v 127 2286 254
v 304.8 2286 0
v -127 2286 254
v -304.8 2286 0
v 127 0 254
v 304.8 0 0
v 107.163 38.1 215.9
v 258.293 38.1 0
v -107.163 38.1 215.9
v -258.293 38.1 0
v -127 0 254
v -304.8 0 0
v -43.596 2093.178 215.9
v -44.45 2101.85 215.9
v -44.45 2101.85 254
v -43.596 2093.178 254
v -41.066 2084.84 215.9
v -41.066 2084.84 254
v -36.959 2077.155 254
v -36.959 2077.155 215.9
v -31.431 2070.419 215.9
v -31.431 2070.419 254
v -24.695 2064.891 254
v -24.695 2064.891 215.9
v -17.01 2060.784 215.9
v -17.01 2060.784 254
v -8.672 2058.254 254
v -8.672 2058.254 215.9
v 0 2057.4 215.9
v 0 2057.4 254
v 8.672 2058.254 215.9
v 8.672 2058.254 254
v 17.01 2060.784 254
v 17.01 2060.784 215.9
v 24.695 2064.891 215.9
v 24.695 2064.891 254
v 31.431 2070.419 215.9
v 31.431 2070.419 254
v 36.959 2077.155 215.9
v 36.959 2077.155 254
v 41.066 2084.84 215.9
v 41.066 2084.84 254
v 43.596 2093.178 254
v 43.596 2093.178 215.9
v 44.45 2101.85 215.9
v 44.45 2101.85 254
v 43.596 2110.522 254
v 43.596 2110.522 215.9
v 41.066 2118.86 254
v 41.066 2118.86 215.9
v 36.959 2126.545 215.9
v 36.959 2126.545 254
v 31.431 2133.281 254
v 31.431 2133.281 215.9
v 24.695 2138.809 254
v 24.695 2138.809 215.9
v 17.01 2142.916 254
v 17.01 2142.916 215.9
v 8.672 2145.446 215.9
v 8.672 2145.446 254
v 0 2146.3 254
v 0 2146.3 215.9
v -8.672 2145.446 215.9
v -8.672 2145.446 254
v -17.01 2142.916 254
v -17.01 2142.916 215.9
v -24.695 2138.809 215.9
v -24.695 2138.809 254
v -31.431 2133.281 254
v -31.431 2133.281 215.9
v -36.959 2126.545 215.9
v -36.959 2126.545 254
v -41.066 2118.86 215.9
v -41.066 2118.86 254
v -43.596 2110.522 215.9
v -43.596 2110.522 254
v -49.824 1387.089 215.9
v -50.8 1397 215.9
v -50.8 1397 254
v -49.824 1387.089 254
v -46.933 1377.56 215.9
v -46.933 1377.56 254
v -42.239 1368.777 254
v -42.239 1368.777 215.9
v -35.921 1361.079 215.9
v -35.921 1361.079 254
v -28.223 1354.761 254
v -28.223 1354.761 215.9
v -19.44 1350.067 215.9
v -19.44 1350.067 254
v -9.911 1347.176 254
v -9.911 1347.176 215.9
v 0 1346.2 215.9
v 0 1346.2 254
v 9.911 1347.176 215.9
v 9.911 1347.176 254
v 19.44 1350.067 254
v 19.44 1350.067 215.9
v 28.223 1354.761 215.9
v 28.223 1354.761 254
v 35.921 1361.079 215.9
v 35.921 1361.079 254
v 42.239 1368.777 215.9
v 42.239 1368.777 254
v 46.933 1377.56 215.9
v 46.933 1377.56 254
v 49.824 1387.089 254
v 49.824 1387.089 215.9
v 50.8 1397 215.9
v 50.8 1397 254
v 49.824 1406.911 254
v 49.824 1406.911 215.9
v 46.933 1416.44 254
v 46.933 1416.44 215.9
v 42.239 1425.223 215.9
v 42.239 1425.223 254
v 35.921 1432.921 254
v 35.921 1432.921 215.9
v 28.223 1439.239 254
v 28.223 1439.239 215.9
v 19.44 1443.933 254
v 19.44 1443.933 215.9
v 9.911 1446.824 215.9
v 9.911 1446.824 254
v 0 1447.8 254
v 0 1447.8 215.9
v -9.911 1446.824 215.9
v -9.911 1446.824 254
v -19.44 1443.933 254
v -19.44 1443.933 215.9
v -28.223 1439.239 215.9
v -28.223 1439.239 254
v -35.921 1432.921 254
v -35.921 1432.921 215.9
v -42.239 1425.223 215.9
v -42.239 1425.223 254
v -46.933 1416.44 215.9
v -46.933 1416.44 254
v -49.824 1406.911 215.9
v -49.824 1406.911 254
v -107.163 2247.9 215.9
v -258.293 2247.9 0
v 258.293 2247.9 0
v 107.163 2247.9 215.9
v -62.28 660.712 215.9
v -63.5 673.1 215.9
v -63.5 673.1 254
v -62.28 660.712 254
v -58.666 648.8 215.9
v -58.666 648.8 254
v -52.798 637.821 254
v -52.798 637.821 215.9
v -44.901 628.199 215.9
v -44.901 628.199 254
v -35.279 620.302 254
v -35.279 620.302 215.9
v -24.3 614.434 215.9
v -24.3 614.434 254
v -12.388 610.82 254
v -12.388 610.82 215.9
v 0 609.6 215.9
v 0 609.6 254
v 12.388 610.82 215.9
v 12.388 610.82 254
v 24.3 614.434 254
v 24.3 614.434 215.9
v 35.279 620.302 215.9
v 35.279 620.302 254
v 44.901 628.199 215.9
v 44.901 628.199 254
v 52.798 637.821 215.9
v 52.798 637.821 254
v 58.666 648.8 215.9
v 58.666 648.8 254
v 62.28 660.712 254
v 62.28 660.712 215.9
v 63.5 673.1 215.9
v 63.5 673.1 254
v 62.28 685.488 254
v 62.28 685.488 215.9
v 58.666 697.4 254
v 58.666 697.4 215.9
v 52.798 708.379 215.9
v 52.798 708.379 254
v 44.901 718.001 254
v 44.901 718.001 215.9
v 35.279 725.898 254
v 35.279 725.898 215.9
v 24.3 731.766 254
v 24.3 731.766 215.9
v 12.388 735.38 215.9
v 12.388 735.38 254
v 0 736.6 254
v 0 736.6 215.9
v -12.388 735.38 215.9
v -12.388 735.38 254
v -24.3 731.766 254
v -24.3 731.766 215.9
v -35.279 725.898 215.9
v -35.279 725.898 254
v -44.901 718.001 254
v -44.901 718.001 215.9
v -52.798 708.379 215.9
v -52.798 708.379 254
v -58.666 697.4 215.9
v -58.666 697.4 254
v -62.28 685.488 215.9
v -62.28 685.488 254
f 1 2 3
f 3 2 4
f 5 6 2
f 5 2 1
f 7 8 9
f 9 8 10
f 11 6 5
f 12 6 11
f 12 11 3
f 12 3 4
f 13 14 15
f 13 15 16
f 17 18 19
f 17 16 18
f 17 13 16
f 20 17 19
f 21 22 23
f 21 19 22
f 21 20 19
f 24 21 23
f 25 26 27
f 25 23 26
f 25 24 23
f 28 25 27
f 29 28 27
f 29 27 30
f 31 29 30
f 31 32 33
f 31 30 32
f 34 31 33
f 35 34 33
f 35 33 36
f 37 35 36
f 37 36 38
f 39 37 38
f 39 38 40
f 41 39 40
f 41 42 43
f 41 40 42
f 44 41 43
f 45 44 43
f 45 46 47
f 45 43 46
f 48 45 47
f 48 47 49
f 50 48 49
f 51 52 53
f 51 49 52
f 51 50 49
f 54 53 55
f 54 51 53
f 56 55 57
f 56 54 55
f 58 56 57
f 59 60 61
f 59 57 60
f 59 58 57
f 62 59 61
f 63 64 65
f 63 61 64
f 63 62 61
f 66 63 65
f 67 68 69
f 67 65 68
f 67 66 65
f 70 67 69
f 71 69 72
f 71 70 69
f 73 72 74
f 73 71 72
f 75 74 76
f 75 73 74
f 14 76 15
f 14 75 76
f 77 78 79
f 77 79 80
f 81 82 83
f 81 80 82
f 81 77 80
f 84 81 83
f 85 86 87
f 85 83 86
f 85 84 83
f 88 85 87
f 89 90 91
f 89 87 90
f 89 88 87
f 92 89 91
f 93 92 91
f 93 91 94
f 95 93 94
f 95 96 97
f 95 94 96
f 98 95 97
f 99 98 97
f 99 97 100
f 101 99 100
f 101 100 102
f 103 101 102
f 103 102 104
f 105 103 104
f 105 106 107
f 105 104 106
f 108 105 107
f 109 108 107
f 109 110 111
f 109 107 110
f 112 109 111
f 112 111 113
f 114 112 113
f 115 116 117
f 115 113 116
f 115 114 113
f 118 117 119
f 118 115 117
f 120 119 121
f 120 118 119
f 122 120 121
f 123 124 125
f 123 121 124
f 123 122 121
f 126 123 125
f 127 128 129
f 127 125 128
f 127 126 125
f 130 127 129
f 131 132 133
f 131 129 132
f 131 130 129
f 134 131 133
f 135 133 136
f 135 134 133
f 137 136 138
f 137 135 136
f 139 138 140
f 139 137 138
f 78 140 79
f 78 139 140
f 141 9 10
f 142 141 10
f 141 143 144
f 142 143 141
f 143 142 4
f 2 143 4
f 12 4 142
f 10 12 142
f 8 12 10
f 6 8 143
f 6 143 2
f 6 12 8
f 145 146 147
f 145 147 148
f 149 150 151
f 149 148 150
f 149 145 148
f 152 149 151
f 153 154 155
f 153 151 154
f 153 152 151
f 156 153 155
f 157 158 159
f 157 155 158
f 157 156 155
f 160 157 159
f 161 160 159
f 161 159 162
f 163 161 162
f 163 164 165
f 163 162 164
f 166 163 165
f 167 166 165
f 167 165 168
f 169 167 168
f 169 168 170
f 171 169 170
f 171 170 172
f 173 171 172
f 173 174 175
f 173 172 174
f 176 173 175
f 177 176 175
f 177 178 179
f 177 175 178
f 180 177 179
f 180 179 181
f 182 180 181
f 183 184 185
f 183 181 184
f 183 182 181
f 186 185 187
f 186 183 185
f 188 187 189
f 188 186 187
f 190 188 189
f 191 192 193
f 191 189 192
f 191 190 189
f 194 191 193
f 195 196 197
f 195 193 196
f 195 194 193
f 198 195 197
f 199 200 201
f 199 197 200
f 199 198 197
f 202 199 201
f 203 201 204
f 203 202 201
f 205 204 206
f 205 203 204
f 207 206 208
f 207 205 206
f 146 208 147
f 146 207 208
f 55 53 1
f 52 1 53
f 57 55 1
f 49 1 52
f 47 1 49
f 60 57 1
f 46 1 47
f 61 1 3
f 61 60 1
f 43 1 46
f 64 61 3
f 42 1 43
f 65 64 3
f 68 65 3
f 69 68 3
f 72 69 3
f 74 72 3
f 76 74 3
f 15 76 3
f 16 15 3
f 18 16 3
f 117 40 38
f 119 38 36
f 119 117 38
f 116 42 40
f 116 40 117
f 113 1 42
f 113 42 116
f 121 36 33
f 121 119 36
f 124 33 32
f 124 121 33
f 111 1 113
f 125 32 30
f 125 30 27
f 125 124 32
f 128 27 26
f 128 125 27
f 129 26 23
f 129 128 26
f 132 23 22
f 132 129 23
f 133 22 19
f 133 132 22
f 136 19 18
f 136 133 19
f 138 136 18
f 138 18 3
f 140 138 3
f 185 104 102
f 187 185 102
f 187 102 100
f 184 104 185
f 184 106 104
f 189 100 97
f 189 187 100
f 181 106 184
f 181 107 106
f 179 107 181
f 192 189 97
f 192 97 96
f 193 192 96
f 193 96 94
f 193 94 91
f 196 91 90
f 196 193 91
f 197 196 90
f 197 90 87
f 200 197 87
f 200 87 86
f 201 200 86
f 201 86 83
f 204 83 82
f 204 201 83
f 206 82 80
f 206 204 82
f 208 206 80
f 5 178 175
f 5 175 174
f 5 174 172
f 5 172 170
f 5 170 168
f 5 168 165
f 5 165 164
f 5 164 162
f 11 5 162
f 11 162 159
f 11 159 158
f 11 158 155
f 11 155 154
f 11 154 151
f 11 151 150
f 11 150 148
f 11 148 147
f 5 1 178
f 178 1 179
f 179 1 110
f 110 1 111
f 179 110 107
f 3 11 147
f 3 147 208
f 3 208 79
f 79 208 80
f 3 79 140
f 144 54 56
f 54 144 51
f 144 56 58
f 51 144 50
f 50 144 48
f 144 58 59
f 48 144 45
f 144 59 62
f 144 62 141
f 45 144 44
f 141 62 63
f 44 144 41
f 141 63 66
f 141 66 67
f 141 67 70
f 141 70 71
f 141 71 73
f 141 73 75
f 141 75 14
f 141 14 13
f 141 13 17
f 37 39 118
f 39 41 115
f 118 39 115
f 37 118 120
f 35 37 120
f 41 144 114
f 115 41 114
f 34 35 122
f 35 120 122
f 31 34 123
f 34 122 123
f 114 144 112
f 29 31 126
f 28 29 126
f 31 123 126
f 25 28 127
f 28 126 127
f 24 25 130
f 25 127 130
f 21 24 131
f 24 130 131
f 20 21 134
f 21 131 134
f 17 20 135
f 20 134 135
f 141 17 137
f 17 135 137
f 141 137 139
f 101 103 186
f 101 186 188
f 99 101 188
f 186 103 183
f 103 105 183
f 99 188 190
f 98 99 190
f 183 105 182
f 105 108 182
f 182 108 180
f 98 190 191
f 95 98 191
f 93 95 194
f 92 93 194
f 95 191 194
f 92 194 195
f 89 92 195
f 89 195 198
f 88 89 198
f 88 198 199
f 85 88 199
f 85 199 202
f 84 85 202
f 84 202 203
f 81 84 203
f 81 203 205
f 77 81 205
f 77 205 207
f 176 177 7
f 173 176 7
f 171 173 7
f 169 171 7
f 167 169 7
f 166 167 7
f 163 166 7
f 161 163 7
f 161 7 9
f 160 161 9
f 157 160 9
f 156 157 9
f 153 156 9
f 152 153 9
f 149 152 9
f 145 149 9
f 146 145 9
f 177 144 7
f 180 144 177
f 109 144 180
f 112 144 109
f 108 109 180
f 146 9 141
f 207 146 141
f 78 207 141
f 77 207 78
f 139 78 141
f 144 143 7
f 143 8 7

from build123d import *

# Parameters (mm, degrees)
BOSS_EXTRUDE1_DEPTH     = 2286
SHELL3_T                = -38.1
CUT_EXTRUDE1_DEPTH      = 2321.175648523
CUT_EXTRUDE1_DEPTH_BACK = 2321.175648523
SKETCH2_R               = 44.45
SKETCH2_R_2             = 50.8
SKETCH2_R_3             = 63.5


with BuildPart() as part:
    # Sketch1 → Boss-Extrude1 (new body)
    with BuildSketch(Plane(origin=(0, 0, 0), x_dir=(1, 0, 0), z_dir=(0, 1, 0))):
        Polygon((-304.8, 0), (304.8, 0), (127, -254), (-127, -254), align=None)
    extrude(amount=BOSS_EXTRUDE1_DEPTH)

    # Shell3
    shell3_openings = [part.faces().sort_by_distance(p)[0] for p in [
        (0, 1143, 0),
    ]]
    offset(amount=SHELL3_T, openings=shell3_openings, kind=Kind.INTERSECTION)

    # Sketch2 → Cut-Extrude1 (cut, two sides: drawn at the far end of the back side and taken through both)
    with BuildSketch(Plane.XY.offset(254).offset(-CUT_EXTRUDE1_DEPTH_BACK)):
        with Locations(Location((0, 2101.85, 0), (0, 0, 180))):
            Circle(SKETCH2_R)
        with Locations(Location((0, 1397, 0), (0, 0, 180))):
            Circle(SKETCH2_R_2)
        with Locations(Location((0, 673.1, 0), (0, 0, 180))):
            Circle(SKETCH2_R_3)
    extrude(amount=CUT_EXTRUDE1_DEPTH + CUT_EXTRUDE1_DEPTH_BACK, mode=Mode.SUBTRACT)


solid = part.part
